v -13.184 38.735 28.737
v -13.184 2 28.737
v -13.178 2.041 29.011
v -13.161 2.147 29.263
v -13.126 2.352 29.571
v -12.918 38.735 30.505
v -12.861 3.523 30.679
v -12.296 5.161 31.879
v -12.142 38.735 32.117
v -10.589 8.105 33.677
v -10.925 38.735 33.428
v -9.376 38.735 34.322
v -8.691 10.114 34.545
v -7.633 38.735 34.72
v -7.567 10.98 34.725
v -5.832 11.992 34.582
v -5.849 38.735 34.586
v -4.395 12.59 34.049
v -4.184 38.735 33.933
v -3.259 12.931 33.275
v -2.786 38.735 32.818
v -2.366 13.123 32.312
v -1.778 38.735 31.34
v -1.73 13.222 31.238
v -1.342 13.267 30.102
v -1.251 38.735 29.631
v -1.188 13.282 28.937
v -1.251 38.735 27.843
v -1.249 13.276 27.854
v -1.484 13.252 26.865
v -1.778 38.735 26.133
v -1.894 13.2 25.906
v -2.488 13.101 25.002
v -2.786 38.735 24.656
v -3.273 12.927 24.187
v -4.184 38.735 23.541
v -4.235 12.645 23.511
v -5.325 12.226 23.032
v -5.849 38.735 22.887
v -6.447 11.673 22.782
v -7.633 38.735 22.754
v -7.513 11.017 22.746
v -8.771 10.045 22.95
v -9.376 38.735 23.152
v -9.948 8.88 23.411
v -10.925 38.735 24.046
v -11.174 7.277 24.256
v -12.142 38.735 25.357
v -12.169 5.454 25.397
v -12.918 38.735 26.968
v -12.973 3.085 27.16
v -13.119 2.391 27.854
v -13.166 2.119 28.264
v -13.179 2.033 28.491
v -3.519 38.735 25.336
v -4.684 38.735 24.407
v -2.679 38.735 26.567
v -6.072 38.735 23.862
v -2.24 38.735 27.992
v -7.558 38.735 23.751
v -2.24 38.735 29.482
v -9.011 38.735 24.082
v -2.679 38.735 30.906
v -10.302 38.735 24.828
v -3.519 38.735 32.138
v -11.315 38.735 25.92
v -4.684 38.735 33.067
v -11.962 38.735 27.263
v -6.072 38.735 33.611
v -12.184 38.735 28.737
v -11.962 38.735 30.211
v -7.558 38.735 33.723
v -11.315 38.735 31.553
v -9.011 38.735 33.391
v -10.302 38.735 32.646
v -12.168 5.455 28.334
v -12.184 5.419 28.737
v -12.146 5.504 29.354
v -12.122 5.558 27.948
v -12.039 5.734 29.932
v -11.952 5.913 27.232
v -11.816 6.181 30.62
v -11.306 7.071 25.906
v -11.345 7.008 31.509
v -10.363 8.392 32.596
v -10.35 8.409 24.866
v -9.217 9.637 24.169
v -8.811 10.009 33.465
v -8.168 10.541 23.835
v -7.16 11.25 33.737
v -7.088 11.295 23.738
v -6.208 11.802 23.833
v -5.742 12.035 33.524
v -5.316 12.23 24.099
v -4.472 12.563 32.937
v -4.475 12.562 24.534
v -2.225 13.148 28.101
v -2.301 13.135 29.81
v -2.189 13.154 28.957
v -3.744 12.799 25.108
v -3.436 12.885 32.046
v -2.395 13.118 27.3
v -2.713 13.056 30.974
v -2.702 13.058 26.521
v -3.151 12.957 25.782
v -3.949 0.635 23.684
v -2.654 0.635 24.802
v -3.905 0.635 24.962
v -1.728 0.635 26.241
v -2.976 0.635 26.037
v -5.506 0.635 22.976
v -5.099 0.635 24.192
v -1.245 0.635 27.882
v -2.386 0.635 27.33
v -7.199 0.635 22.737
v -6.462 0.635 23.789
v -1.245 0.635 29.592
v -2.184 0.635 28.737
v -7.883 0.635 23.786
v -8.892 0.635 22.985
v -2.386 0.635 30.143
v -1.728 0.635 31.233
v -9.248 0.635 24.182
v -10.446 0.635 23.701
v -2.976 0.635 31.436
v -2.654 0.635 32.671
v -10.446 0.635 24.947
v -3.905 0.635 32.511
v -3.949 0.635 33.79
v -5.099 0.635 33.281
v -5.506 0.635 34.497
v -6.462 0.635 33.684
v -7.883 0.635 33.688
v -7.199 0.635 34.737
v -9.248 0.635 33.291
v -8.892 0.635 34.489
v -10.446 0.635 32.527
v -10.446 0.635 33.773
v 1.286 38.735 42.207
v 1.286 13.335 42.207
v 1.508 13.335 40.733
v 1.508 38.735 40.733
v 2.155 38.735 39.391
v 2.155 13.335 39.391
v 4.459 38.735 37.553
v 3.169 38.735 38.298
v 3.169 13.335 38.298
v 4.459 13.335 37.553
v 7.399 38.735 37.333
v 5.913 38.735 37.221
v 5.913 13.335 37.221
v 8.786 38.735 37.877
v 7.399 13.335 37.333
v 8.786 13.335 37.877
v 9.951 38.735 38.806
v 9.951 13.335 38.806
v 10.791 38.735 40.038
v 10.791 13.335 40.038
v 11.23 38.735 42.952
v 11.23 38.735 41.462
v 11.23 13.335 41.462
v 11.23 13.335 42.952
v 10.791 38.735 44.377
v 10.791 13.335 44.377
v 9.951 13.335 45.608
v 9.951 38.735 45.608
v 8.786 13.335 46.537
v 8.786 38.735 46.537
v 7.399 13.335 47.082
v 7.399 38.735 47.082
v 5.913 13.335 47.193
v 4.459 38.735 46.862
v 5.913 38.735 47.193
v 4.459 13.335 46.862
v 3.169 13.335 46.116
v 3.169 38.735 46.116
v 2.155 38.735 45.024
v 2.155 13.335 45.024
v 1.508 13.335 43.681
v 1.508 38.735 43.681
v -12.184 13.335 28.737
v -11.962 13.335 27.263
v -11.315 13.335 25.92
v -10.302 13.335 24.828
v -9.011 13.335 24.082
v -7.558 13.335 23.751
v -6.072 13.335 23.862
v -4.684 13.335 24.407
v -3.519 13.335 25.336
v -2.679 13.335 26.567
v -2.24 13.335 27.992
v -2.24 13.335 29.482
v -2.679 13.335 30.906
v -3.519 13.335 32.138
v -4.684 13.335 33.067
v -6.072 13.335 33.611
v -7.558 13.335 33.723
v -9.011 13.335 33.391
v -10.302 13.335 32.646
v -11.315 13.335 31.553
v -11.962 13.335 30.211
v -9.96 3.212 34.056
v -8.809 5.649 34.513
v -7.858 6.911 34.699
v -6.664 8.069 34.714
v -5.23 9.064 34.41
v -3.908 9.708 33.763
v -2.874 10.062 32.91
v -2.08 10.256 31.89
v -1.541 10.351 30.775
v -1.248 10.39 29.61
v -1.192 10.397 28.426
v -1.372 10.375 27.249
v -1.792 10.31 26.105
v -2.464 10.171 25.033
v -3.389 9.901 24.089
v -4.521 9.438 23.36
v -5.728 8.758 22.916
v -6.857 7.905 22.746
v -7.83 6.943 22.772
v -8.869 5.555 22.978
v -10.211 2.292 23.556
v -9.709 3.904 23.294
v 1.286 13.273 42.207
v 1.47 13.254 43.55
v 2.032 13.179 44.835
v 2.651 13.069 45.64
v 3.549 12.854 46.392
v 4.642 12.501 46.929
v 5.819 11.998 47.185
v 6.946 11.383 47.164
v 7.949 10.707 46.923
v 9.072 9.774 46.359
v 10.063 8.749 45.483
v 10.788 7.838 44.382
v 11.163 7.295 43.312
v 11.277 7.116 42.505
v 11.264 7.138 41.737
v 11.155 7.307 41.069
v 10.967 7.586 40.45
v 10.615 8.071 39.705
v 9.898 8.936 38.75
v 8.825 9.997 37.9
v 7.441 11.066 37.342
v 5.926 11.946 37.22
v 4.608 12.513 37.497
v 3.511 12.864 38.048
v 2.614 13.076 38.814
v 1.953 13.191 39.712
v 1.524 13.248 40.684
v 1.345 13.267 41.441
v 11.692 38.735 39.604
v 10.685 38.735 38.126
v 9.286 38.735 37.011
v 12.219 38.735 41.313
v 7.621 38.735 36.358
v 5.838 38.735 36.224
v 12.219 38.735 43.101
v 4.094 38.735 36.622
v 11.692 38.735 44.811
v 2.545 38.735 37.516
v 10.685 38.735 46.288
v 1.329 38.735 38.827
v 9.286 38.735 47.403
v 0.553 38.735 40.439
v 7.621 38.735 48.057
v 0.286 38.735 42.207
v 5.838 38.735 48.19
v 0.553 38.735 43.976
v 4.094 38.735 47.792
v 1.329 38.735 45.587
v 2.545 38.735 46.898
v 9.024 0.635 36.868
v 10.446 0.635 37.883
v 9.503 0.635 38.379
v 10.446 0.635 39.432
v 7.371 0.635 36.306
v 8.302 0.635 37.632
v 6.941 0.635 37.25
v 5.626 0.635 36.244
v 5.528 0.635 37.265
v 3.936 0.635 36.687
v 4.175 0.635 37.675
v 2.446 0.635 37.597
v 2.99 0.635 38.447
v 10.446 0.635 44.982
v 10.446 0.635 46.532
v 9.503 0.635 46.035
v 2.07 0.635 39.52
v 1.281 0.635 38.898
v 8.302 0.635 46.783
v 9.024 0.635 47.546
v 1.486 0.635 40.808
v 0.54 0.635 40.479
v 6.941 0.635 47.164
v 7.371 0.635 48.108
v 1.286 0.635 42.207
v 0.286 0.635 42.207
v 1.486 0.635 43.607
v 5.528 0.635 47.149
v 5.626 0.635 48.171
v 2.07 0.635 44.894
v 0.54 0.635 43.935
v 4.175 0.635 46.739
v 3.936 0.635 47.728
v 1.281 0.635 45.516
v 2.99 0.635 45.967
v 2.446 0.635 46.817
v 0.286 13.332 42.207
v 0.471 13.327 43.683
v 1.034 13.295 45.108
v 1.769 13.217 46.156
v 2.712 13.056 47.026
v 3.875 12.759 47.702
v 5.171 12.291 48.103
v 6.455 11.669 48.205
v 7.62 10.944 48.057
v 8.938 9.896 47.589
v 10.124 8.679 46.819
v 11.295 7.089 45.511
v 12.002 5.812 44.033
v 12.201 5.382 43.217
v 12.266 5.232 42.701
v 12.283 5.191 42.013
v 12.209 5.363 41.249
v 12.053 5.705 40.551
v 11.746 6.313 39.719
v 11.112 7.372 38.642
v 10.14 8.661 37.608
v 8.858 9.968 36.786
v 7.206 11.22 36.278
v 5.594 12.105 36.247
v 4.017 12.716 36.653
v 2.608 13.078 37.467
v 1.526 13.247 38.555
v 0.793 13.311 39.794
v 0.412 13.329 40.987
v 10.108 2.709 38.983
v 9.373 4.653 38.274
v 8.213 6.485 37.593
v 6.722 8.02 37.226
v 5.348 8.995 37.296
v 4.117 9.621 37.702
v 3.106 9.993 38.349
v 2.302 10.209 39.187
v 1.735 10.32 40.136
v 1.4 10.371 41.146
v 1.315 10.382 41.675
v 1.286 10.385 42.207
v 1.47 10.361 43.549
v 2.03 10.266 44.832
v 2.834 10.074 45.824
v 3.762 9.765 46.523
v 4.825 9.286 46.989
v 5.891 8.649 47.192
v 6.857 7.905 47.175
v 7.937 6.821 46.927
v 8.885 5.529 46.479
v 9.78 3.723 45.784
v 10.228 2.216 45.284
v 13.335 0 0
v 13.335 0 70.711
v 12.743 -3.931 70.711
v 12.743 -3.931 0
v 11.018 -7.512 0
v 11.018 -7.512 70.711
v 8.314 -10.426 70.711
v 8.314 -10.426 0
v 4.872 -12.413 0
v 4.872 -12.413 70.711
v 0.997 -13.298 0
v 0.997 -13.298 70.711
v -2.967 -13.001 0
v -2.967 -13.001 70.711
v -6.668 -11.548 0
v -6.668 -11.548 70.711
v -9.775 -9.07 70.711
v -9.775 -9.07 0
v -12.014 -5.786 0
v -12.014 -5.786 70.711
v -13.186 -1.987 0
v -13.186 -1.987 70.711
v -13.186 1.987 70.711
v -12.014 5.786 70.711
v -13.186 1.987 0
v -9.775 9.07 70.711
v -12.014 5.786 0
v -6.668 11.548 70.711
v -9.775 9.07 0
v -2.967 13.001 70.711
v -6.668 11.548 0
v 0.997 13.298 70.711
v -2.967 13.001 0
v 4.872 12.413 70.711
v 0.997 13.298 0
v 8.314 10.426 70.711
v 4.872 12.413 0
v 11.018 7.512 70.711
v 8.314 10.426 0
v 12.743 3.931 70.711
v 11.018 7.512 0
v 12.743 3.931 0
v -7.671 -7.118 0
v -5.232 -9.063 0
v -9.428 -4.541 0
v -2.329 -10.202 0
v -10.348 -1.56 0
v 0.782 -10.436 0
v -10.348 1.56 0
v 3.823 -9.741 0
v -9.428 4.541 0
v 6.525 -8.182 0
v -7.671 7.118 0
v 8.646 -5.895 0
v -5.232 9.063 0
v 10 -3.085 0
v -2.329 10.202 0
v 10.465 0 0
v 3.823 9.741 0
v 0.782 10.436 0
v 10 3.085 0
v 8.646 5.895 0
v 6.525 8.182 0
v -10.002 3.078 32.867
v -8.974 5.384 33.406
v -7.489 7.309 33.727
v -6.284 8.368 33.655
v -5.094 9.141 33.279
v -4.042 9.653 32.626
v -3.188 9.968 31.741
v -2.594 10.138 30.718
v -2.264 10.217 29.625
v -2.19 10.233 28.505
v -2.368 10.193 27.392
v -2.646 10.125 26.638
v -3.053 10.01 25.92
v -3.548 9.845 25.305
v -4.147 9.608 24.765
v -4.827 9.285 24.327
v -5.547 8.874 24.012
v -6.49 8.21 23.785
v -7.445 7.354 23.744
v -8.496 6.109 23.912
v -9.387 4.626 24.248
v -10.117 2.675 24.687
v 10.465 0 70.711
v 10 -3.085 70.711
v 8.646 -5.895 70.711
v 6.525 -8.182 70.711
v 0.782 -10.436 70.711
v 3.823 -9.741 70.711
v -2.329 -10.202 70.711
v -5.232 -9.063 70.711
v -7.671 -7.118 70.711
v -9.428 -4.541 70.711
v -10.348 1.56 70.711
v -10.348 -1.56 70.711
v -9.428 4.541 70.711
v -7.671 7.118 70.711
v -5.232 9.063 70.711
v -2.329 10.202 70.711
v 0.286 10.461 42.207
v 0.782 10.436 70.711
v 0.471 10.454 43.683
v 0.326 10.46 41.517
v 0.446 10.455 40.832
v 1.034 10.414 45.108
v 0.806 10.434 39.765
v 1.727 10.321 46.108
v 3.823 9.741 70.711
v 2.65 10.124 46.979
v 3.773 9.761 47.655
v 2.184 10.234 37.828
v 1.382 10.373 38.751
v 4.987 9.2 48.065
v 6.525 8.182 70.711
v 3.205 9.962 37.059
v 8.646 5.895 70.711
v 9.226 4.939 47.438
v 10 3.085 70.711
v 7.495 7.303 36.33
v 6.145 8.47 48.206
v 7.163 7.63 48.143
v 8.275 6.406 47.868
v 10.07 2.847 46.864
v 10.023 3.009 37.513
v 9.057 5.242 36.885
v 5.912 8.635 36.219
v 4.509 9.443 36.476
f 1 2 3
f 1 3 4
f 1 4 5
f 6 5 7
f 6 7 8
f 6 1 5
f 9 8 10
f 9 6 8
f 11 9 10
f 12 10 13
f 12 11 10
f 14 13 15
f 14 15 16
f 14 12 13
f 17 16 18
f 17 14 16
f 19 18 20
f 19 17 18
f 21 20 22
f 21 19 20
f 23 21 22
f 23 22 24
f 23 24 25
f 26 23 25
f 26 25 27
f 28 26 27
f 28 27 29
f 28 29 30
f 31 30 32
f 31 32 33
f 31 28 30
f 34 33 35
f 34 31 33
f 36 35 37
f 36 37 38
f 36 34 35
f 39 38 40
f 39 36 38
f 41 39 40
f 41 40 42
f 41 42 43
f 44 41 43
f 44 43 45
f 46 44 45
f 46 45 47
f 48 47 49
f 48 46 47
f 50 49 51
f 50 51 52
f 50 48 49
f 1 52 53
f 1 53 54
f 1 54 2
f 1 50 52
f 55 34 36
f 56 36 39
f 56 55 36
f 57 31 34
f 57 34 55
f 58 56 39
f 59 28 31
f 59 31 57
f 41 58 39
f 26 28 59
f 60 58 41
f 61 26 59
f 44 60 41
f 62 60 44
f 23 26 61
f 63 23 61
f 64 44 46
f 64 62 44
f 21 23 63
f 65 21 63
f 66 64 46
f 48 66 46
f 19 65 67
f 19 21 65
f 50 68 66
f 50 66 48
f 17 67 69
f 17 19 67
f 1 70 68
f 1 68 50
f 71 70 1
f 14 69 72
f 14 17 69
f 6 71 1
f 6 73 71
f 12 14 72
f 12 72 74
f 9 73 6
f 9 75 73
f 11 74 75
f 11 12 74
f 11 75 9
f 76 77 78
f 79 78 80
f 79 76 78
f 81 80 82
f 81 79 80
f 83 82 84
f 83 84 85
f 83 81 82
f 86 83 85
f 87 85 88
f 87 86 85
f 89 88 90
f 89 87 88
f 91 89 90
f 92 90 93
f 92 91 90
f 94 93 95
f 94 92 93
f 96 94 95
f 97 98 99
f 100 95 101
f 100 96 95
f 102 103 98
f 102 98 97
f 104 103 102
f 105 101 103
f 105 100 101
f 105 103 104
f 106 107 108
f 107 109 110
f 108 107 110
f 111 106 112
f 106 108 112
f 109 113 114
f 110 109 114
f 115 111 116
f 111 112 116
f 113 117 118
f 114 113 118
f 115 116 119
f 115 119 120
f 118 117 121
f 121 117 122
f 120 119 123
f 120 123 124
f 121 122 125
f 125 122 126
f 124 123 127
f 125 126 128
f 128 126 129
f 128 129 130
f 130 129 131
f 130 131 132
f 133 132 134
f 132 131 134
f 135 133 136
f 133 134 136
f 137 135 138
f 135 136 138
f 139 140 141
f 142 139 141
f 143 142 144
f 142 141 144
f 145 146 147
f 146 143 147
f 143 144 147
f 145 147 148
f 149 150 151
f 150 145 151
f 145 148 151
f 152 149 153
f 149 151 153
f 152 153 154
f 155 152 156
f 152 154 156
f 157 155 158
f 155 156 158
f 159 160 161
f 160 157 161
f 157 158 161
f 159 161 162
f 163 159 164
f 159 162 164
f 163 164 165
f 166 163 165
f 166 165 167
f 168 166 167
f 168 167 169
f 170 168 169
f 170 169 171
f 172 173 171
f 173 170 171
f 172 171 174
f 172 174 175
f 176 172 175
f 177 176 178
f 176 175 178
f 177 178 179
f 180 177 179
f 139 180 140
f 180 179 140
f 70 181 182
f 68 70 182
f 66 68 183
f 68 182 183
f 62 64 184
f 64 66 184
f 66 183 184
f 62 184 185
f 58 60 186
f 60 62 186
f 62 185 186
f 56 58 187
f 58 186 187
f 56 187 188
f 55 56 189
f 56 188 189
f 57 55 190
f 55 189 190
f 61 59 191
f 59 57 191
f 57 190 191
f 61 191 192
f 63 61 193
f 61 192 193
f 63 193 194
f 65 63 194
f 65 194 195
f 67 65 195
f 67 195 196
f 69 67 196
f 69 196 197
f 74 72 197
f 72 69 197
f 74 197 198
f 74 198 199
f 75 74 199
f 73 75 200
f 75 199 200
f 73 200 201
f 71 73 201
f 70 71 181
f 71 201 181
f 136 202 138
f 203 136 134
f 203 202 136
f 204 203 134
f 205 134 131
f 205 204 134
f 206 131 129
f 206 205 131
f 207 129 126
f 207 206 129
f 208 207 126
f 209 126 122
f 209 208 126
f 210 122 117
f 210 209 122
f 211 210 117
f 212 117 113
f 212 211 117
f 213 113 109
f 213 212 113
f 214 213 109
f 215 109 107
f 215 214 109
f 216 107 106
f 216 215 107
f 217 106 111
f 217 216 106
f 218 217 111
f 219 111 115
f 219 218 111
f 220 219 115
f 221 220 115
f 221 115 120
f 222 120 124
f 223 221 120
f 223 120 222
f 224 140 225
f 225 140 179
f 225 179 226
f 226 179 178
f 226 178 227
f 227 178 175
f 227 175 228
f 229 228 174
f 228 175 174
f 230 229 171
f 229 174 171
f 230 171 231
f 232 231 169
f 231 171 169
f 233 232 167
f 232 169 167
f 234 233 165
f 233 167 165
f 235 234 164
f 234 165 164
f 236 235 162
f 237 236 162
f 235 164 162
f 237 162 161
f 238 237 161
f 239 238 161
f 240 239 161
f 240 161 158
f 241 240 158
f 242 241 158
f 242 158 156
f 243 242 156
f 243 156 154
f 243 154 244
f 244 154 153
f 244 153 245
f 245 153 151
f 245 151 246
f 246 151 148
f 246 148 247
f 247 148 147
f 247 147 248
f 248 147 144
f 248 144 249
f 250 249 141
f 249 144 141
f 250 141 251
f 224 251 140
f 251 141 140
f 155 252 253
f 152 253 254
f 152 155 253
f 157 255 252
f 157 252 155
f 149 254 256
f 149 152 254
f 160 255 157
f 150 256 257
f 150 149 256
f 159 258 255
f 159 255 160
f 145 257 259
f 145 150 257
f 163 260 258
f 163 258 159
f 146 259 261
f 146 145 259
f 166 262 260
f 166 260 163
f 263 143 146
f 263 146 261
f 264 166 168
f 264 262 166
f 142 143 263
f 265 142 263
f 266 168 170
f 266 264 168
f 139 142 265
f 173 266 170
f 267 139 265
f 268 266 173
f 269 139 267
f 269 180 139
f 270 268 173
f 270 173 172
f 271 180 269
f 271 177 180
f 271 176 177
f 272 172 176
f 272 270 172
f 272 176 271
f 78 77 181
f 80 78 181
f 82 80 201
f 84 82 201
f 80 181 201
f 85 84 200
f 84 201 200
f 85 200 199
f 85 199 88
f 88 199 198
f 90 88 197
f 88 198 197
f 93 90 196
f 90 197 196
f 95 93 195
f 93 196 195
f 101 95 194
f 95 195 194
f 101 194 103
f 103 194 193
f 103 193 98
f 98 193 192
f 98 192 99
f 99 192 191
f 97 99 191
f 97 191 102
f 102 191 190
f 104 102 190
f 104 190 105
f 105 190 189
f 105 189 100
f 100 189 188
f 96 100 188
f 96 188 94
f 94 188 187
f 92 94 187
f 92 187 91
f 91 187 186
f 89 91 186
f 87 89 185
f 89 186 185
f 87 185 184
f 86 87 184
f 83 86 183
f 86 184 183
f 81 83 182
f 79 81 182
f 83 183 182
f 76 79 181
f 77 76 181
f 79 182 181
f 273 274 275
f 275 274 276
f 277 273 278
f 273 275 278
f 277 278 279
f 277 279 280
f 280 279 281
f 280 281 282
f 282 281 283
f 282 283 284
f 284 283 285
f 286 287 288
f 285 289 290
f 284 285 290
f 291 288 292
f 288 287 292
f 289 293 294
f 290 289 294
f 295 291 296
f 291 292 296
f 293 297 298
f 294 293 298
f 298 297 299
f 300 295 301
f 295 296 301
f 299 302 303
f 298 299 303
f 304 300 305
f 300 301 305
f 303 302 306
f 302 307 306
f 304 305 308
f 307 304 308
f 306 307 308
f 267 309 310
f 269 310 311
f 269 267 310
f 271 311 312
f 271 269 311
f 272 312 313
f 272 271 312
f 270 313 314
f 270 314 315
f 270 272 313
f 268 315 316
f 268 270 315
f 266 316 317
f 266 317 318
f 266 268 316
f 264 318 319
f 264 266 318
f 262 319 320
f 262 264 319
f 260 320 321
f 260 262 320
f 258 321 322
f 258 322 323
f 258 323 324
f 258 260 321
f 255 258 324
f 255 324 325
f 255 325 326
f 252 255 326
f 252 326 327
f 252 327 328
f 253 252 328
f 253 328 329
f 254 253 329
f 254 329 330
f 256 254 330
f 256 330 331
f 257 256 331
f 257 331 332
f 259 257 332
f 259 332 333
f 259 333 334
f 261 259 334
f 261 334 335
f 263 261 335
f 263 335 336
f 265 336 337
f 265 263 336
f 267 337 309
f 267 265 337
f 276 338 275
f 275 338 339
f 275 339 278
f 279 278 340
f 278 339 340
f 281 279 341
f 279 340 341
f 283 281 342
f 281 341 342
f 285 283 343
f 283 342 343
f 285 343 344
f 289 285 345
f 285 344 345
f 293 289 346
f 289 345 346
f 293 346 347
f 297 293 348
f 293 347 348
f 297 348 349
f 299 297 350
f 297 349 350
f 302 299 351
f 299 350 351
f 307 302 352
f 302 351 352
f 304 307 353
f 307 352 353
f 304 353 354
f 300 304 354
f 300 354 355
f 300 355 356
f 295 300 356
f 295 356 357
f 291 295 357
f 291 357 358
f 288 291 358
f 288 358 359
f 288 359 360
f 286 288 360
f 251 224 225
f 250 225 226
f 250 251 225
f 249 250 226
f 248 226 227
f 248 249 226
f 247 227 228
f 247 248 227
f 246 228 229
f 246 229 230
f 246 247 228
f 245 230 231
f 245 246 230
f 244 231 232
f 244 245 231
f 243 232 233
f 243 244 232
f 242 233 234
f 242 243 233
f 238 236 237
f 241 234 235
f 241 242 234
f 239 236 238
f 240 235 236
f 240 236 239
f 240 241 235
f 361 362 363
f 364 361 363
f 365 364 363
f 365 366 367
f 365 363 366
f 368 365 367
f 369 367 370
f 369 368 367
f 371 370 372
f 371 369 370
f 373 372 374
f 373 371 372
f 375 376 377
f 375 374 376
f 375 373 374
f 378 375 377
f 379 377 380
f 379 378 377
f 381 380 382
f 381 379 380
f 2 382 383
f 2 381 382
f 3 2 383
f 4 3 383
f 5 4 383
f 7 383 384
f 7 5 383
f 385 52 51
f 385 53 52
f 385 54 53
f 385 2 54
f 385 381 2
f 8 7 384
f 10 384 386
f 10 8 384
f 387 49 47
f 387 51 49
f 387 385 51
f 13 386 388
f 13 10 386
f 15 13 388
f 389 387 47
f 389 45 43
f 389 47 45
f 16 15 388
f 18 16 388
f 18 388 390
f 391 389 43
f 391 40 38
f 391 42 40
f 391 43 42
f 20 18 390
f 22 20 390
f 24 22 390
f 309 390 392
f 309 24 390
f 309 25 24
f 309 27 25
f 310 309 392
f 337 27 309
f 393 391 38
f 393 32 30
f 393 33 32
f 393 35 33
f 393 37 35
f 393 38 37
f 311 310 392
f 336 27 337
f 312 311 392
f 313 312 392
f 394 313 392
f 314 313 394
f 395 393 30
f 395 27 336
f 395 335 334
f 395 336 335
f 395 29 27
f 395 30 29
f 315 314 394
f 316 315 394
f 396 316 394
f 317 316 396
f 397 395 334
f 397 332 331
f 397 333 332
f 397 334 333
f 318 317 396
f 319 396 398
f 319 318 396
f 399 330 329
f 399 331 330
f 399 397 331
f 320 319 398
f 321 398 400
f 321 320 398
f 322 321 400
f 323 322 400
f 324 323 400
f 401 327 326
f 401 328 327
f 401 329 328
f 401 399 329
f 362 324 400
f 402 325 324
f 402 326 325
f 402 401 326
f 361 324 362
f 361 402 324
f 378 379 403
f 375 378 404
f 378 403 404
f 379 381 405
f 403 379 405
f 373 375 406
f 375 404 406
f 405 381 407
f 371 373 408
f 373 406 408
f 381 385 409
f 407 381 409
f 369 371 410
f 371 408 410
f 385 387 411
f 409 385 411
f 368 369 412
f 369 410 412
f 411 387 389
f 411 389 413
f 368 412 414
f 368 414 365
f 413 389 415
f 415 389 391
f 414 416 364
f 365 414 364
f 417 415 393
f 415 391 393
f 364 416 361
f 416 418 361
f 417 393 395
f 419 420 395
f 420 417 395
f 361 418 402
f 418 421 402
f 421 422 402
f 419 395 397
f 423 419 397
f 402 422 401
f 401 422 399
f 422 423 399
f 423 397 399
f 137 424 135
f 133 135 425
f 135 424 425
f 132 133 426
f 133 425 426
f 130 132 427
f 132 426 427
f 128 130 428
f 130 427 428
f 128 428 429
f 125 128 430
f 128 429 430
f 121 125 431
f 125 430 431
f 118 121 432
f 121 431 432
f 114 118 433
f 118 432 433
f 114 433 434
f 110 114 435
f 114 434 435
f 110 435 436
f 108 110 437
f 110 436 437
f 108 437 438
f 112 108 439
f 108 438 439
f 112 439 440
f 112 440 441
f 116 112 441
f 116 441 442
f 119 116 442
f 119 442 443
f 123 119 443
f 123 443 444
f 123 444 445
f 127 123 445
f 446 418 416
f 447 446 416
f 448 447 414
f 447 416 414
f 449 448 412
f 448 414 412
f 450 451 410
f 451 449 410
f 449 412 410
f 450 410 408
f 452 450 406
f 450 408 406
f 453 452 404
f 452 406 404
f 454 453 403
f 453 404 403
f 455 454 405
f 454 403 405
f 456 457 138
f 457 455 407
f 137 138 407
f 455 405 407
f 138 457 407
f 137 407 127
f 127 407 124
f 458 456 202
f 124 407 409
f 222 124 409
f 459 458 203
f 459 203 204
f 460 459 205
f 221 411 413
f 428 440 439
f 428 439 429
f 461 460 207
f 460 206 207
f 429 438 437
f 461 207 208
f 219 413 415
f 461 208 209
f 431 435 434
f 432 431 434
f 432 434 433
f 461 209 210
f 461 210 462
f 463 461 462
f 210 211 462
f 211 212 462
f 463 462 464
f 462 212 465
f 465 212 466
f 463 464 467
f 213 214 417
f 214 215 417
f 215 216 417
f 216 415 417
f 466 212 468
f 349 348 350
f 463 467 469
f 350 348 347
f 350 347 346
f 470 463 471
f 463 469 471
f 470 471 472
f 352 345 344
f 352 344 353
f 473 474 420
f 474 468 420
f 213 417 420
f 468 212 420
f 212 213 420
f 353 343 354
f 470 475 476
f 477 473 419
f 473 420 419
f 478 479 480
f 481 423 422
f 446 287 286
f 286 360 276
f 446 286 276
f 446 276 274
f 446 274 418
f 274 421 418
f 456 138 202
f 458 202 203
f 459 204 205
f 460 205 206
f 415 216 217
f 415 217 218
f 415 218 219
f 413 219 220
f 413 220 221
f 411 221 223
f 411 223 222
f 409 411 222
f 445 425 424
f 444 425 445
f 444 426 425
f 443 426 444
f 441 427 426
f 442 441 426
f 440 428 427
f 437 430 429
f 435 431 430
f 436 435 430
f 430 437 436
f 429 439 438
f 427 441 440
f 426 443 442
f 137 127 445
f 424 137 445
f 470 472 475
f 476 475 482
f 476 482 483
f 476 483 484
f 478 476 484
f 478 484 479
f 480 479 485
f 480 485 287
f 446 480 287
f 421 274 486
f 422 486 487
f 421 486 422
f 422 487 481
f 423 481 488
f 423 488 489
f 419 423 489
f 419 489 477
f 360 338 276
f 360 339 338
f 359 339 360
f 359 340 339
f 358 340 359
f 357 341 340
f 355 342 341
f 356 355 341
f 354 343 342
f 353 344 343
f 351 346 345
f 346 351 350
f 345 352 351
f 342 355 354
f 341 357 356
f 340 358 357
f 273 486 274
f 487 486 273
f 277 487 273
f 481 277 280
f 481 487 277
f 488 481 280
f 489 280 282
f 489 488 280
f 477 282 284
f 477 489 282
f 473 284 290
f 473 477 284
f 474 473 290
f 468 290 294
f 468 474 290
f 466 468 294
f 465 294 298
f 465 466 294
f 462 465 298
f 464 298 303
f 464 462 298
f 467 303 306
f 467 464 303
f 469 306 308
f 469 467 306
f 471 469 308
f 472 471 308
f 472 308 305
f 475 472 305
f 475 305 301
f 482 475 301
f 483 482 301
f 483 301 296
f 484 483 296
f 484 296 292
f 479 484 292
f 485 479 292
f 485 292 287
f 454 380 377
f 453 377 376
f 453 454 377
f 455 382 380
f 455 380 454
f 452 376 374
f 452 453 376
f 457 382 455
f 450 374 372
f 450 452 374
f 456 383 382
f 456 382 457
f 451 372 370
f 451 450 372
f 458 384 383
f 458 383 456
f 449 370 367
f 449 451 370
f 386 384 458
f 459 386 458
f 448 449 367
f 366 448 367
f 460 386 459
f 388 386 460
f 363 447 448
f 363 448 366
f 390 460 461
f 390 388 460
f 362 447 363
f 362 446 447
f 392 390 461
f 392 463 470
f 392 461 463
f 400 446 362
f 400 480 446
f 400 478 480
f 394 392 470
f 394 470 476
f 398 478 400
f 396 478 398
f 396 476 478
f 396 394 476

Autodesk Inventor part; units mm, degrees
ref_plane "Start Plane" through (0, 0, 0) normal (0, 0, 1) x (1, 0, 0)
ref_plane "End Plane" through (0, 0, 70.7107) normal (0, 0, 1) x (1, 0, 0)
sketch "Sketch" plane through (0, 0, 0) normal (0, 0, 1) x (1, 0, 0)
  circle A0 centre (0, 0) radius 10.4648
  circle A1 centre (0, 0) radius 13.335
  dimension "d0" = 26.67
  dimension "d1" = 2.8702
extrude "Body" add sketch "Sketch" along normal up to surface (70.7107 mm away) from surface at 0
sketch "Sketch3" plane through (0, 0, 0) normal (0, 0, 1) x (1, 0, 0)
  line L0 (0, 0) -> (10, 0)
ref_plane "Work Plane3" through (0, 0, 0) normal (0, -1, 0) x (1, 0, 0)
ref_plane "Work Plane4" through (0, 13.335, 0) normal (0, 1, 0) x (-1, 0, 0)
sketch "Sketch7" plane through (0, 13.335, 0) normal (0, 1, 0) x (-1, 0, 0)
  line L0 (-20.6433, 0) -> (18.9981, 0) construction
  line L1 (0, -14.1421) -> (0, 84.8528) construction
  line L2 (0, 0) -> (17.9605, 17.9605)
  line L3 (17.9605, 17.9605) -> (7.1842, 28.7368) construction
  circle A0 centre (7.1842, 28.7368) radius 5
  line L4 (7.1842, 28.7368) -> (-6.2862, 42.2072) construction
  circle A1 centre (7.1842, 28.7368) radius 6
  circle A2 centre (-6.2862, 42.2072) radius 5
  circle A3 centre (-6.2862, 42.2072) radius 6
  dimension "d23" = 45
  dimension "d24" = 25.4
  dimension "d25" = 15.24
  dimension "d26" = 19.05
  dimension "d28" = 12
  dimension "d29" = 10
extrude "Extrusion3" add sketch "Sketch7" along normal blind 25.4 and the other way blind 12.7
sketch "Sketch4" plane through (0, 0, 0) normal (0, -1, 0) x (1, 0, 0)
  line L0 (-2, 0) -> (12, 0) projected
  line L1 (-2, 70.7107) -> (12, 70.7107) projected
  dimension "d7" = 70.7107
equation "\"d0\" = G_H"
equation "\"d1\" = G_T"
equation "\"d2\" = G_L"
equation "\"G_H\" = 26.67"
equation "\"G_T\" = 2.8702"
equation "\"G_L\" = d7"
equation "\"G_OFFSET_START\" = 0"
equation "\"G_OFFSET_END\" = 0"
equation "\"d5\" = G_OFFSET_END + B_L"
equation "\"B_L\" = 70.71068"
properties part number "ANSI - 3/4 x 0.113 - 2.784" material "Steel, Mild"
